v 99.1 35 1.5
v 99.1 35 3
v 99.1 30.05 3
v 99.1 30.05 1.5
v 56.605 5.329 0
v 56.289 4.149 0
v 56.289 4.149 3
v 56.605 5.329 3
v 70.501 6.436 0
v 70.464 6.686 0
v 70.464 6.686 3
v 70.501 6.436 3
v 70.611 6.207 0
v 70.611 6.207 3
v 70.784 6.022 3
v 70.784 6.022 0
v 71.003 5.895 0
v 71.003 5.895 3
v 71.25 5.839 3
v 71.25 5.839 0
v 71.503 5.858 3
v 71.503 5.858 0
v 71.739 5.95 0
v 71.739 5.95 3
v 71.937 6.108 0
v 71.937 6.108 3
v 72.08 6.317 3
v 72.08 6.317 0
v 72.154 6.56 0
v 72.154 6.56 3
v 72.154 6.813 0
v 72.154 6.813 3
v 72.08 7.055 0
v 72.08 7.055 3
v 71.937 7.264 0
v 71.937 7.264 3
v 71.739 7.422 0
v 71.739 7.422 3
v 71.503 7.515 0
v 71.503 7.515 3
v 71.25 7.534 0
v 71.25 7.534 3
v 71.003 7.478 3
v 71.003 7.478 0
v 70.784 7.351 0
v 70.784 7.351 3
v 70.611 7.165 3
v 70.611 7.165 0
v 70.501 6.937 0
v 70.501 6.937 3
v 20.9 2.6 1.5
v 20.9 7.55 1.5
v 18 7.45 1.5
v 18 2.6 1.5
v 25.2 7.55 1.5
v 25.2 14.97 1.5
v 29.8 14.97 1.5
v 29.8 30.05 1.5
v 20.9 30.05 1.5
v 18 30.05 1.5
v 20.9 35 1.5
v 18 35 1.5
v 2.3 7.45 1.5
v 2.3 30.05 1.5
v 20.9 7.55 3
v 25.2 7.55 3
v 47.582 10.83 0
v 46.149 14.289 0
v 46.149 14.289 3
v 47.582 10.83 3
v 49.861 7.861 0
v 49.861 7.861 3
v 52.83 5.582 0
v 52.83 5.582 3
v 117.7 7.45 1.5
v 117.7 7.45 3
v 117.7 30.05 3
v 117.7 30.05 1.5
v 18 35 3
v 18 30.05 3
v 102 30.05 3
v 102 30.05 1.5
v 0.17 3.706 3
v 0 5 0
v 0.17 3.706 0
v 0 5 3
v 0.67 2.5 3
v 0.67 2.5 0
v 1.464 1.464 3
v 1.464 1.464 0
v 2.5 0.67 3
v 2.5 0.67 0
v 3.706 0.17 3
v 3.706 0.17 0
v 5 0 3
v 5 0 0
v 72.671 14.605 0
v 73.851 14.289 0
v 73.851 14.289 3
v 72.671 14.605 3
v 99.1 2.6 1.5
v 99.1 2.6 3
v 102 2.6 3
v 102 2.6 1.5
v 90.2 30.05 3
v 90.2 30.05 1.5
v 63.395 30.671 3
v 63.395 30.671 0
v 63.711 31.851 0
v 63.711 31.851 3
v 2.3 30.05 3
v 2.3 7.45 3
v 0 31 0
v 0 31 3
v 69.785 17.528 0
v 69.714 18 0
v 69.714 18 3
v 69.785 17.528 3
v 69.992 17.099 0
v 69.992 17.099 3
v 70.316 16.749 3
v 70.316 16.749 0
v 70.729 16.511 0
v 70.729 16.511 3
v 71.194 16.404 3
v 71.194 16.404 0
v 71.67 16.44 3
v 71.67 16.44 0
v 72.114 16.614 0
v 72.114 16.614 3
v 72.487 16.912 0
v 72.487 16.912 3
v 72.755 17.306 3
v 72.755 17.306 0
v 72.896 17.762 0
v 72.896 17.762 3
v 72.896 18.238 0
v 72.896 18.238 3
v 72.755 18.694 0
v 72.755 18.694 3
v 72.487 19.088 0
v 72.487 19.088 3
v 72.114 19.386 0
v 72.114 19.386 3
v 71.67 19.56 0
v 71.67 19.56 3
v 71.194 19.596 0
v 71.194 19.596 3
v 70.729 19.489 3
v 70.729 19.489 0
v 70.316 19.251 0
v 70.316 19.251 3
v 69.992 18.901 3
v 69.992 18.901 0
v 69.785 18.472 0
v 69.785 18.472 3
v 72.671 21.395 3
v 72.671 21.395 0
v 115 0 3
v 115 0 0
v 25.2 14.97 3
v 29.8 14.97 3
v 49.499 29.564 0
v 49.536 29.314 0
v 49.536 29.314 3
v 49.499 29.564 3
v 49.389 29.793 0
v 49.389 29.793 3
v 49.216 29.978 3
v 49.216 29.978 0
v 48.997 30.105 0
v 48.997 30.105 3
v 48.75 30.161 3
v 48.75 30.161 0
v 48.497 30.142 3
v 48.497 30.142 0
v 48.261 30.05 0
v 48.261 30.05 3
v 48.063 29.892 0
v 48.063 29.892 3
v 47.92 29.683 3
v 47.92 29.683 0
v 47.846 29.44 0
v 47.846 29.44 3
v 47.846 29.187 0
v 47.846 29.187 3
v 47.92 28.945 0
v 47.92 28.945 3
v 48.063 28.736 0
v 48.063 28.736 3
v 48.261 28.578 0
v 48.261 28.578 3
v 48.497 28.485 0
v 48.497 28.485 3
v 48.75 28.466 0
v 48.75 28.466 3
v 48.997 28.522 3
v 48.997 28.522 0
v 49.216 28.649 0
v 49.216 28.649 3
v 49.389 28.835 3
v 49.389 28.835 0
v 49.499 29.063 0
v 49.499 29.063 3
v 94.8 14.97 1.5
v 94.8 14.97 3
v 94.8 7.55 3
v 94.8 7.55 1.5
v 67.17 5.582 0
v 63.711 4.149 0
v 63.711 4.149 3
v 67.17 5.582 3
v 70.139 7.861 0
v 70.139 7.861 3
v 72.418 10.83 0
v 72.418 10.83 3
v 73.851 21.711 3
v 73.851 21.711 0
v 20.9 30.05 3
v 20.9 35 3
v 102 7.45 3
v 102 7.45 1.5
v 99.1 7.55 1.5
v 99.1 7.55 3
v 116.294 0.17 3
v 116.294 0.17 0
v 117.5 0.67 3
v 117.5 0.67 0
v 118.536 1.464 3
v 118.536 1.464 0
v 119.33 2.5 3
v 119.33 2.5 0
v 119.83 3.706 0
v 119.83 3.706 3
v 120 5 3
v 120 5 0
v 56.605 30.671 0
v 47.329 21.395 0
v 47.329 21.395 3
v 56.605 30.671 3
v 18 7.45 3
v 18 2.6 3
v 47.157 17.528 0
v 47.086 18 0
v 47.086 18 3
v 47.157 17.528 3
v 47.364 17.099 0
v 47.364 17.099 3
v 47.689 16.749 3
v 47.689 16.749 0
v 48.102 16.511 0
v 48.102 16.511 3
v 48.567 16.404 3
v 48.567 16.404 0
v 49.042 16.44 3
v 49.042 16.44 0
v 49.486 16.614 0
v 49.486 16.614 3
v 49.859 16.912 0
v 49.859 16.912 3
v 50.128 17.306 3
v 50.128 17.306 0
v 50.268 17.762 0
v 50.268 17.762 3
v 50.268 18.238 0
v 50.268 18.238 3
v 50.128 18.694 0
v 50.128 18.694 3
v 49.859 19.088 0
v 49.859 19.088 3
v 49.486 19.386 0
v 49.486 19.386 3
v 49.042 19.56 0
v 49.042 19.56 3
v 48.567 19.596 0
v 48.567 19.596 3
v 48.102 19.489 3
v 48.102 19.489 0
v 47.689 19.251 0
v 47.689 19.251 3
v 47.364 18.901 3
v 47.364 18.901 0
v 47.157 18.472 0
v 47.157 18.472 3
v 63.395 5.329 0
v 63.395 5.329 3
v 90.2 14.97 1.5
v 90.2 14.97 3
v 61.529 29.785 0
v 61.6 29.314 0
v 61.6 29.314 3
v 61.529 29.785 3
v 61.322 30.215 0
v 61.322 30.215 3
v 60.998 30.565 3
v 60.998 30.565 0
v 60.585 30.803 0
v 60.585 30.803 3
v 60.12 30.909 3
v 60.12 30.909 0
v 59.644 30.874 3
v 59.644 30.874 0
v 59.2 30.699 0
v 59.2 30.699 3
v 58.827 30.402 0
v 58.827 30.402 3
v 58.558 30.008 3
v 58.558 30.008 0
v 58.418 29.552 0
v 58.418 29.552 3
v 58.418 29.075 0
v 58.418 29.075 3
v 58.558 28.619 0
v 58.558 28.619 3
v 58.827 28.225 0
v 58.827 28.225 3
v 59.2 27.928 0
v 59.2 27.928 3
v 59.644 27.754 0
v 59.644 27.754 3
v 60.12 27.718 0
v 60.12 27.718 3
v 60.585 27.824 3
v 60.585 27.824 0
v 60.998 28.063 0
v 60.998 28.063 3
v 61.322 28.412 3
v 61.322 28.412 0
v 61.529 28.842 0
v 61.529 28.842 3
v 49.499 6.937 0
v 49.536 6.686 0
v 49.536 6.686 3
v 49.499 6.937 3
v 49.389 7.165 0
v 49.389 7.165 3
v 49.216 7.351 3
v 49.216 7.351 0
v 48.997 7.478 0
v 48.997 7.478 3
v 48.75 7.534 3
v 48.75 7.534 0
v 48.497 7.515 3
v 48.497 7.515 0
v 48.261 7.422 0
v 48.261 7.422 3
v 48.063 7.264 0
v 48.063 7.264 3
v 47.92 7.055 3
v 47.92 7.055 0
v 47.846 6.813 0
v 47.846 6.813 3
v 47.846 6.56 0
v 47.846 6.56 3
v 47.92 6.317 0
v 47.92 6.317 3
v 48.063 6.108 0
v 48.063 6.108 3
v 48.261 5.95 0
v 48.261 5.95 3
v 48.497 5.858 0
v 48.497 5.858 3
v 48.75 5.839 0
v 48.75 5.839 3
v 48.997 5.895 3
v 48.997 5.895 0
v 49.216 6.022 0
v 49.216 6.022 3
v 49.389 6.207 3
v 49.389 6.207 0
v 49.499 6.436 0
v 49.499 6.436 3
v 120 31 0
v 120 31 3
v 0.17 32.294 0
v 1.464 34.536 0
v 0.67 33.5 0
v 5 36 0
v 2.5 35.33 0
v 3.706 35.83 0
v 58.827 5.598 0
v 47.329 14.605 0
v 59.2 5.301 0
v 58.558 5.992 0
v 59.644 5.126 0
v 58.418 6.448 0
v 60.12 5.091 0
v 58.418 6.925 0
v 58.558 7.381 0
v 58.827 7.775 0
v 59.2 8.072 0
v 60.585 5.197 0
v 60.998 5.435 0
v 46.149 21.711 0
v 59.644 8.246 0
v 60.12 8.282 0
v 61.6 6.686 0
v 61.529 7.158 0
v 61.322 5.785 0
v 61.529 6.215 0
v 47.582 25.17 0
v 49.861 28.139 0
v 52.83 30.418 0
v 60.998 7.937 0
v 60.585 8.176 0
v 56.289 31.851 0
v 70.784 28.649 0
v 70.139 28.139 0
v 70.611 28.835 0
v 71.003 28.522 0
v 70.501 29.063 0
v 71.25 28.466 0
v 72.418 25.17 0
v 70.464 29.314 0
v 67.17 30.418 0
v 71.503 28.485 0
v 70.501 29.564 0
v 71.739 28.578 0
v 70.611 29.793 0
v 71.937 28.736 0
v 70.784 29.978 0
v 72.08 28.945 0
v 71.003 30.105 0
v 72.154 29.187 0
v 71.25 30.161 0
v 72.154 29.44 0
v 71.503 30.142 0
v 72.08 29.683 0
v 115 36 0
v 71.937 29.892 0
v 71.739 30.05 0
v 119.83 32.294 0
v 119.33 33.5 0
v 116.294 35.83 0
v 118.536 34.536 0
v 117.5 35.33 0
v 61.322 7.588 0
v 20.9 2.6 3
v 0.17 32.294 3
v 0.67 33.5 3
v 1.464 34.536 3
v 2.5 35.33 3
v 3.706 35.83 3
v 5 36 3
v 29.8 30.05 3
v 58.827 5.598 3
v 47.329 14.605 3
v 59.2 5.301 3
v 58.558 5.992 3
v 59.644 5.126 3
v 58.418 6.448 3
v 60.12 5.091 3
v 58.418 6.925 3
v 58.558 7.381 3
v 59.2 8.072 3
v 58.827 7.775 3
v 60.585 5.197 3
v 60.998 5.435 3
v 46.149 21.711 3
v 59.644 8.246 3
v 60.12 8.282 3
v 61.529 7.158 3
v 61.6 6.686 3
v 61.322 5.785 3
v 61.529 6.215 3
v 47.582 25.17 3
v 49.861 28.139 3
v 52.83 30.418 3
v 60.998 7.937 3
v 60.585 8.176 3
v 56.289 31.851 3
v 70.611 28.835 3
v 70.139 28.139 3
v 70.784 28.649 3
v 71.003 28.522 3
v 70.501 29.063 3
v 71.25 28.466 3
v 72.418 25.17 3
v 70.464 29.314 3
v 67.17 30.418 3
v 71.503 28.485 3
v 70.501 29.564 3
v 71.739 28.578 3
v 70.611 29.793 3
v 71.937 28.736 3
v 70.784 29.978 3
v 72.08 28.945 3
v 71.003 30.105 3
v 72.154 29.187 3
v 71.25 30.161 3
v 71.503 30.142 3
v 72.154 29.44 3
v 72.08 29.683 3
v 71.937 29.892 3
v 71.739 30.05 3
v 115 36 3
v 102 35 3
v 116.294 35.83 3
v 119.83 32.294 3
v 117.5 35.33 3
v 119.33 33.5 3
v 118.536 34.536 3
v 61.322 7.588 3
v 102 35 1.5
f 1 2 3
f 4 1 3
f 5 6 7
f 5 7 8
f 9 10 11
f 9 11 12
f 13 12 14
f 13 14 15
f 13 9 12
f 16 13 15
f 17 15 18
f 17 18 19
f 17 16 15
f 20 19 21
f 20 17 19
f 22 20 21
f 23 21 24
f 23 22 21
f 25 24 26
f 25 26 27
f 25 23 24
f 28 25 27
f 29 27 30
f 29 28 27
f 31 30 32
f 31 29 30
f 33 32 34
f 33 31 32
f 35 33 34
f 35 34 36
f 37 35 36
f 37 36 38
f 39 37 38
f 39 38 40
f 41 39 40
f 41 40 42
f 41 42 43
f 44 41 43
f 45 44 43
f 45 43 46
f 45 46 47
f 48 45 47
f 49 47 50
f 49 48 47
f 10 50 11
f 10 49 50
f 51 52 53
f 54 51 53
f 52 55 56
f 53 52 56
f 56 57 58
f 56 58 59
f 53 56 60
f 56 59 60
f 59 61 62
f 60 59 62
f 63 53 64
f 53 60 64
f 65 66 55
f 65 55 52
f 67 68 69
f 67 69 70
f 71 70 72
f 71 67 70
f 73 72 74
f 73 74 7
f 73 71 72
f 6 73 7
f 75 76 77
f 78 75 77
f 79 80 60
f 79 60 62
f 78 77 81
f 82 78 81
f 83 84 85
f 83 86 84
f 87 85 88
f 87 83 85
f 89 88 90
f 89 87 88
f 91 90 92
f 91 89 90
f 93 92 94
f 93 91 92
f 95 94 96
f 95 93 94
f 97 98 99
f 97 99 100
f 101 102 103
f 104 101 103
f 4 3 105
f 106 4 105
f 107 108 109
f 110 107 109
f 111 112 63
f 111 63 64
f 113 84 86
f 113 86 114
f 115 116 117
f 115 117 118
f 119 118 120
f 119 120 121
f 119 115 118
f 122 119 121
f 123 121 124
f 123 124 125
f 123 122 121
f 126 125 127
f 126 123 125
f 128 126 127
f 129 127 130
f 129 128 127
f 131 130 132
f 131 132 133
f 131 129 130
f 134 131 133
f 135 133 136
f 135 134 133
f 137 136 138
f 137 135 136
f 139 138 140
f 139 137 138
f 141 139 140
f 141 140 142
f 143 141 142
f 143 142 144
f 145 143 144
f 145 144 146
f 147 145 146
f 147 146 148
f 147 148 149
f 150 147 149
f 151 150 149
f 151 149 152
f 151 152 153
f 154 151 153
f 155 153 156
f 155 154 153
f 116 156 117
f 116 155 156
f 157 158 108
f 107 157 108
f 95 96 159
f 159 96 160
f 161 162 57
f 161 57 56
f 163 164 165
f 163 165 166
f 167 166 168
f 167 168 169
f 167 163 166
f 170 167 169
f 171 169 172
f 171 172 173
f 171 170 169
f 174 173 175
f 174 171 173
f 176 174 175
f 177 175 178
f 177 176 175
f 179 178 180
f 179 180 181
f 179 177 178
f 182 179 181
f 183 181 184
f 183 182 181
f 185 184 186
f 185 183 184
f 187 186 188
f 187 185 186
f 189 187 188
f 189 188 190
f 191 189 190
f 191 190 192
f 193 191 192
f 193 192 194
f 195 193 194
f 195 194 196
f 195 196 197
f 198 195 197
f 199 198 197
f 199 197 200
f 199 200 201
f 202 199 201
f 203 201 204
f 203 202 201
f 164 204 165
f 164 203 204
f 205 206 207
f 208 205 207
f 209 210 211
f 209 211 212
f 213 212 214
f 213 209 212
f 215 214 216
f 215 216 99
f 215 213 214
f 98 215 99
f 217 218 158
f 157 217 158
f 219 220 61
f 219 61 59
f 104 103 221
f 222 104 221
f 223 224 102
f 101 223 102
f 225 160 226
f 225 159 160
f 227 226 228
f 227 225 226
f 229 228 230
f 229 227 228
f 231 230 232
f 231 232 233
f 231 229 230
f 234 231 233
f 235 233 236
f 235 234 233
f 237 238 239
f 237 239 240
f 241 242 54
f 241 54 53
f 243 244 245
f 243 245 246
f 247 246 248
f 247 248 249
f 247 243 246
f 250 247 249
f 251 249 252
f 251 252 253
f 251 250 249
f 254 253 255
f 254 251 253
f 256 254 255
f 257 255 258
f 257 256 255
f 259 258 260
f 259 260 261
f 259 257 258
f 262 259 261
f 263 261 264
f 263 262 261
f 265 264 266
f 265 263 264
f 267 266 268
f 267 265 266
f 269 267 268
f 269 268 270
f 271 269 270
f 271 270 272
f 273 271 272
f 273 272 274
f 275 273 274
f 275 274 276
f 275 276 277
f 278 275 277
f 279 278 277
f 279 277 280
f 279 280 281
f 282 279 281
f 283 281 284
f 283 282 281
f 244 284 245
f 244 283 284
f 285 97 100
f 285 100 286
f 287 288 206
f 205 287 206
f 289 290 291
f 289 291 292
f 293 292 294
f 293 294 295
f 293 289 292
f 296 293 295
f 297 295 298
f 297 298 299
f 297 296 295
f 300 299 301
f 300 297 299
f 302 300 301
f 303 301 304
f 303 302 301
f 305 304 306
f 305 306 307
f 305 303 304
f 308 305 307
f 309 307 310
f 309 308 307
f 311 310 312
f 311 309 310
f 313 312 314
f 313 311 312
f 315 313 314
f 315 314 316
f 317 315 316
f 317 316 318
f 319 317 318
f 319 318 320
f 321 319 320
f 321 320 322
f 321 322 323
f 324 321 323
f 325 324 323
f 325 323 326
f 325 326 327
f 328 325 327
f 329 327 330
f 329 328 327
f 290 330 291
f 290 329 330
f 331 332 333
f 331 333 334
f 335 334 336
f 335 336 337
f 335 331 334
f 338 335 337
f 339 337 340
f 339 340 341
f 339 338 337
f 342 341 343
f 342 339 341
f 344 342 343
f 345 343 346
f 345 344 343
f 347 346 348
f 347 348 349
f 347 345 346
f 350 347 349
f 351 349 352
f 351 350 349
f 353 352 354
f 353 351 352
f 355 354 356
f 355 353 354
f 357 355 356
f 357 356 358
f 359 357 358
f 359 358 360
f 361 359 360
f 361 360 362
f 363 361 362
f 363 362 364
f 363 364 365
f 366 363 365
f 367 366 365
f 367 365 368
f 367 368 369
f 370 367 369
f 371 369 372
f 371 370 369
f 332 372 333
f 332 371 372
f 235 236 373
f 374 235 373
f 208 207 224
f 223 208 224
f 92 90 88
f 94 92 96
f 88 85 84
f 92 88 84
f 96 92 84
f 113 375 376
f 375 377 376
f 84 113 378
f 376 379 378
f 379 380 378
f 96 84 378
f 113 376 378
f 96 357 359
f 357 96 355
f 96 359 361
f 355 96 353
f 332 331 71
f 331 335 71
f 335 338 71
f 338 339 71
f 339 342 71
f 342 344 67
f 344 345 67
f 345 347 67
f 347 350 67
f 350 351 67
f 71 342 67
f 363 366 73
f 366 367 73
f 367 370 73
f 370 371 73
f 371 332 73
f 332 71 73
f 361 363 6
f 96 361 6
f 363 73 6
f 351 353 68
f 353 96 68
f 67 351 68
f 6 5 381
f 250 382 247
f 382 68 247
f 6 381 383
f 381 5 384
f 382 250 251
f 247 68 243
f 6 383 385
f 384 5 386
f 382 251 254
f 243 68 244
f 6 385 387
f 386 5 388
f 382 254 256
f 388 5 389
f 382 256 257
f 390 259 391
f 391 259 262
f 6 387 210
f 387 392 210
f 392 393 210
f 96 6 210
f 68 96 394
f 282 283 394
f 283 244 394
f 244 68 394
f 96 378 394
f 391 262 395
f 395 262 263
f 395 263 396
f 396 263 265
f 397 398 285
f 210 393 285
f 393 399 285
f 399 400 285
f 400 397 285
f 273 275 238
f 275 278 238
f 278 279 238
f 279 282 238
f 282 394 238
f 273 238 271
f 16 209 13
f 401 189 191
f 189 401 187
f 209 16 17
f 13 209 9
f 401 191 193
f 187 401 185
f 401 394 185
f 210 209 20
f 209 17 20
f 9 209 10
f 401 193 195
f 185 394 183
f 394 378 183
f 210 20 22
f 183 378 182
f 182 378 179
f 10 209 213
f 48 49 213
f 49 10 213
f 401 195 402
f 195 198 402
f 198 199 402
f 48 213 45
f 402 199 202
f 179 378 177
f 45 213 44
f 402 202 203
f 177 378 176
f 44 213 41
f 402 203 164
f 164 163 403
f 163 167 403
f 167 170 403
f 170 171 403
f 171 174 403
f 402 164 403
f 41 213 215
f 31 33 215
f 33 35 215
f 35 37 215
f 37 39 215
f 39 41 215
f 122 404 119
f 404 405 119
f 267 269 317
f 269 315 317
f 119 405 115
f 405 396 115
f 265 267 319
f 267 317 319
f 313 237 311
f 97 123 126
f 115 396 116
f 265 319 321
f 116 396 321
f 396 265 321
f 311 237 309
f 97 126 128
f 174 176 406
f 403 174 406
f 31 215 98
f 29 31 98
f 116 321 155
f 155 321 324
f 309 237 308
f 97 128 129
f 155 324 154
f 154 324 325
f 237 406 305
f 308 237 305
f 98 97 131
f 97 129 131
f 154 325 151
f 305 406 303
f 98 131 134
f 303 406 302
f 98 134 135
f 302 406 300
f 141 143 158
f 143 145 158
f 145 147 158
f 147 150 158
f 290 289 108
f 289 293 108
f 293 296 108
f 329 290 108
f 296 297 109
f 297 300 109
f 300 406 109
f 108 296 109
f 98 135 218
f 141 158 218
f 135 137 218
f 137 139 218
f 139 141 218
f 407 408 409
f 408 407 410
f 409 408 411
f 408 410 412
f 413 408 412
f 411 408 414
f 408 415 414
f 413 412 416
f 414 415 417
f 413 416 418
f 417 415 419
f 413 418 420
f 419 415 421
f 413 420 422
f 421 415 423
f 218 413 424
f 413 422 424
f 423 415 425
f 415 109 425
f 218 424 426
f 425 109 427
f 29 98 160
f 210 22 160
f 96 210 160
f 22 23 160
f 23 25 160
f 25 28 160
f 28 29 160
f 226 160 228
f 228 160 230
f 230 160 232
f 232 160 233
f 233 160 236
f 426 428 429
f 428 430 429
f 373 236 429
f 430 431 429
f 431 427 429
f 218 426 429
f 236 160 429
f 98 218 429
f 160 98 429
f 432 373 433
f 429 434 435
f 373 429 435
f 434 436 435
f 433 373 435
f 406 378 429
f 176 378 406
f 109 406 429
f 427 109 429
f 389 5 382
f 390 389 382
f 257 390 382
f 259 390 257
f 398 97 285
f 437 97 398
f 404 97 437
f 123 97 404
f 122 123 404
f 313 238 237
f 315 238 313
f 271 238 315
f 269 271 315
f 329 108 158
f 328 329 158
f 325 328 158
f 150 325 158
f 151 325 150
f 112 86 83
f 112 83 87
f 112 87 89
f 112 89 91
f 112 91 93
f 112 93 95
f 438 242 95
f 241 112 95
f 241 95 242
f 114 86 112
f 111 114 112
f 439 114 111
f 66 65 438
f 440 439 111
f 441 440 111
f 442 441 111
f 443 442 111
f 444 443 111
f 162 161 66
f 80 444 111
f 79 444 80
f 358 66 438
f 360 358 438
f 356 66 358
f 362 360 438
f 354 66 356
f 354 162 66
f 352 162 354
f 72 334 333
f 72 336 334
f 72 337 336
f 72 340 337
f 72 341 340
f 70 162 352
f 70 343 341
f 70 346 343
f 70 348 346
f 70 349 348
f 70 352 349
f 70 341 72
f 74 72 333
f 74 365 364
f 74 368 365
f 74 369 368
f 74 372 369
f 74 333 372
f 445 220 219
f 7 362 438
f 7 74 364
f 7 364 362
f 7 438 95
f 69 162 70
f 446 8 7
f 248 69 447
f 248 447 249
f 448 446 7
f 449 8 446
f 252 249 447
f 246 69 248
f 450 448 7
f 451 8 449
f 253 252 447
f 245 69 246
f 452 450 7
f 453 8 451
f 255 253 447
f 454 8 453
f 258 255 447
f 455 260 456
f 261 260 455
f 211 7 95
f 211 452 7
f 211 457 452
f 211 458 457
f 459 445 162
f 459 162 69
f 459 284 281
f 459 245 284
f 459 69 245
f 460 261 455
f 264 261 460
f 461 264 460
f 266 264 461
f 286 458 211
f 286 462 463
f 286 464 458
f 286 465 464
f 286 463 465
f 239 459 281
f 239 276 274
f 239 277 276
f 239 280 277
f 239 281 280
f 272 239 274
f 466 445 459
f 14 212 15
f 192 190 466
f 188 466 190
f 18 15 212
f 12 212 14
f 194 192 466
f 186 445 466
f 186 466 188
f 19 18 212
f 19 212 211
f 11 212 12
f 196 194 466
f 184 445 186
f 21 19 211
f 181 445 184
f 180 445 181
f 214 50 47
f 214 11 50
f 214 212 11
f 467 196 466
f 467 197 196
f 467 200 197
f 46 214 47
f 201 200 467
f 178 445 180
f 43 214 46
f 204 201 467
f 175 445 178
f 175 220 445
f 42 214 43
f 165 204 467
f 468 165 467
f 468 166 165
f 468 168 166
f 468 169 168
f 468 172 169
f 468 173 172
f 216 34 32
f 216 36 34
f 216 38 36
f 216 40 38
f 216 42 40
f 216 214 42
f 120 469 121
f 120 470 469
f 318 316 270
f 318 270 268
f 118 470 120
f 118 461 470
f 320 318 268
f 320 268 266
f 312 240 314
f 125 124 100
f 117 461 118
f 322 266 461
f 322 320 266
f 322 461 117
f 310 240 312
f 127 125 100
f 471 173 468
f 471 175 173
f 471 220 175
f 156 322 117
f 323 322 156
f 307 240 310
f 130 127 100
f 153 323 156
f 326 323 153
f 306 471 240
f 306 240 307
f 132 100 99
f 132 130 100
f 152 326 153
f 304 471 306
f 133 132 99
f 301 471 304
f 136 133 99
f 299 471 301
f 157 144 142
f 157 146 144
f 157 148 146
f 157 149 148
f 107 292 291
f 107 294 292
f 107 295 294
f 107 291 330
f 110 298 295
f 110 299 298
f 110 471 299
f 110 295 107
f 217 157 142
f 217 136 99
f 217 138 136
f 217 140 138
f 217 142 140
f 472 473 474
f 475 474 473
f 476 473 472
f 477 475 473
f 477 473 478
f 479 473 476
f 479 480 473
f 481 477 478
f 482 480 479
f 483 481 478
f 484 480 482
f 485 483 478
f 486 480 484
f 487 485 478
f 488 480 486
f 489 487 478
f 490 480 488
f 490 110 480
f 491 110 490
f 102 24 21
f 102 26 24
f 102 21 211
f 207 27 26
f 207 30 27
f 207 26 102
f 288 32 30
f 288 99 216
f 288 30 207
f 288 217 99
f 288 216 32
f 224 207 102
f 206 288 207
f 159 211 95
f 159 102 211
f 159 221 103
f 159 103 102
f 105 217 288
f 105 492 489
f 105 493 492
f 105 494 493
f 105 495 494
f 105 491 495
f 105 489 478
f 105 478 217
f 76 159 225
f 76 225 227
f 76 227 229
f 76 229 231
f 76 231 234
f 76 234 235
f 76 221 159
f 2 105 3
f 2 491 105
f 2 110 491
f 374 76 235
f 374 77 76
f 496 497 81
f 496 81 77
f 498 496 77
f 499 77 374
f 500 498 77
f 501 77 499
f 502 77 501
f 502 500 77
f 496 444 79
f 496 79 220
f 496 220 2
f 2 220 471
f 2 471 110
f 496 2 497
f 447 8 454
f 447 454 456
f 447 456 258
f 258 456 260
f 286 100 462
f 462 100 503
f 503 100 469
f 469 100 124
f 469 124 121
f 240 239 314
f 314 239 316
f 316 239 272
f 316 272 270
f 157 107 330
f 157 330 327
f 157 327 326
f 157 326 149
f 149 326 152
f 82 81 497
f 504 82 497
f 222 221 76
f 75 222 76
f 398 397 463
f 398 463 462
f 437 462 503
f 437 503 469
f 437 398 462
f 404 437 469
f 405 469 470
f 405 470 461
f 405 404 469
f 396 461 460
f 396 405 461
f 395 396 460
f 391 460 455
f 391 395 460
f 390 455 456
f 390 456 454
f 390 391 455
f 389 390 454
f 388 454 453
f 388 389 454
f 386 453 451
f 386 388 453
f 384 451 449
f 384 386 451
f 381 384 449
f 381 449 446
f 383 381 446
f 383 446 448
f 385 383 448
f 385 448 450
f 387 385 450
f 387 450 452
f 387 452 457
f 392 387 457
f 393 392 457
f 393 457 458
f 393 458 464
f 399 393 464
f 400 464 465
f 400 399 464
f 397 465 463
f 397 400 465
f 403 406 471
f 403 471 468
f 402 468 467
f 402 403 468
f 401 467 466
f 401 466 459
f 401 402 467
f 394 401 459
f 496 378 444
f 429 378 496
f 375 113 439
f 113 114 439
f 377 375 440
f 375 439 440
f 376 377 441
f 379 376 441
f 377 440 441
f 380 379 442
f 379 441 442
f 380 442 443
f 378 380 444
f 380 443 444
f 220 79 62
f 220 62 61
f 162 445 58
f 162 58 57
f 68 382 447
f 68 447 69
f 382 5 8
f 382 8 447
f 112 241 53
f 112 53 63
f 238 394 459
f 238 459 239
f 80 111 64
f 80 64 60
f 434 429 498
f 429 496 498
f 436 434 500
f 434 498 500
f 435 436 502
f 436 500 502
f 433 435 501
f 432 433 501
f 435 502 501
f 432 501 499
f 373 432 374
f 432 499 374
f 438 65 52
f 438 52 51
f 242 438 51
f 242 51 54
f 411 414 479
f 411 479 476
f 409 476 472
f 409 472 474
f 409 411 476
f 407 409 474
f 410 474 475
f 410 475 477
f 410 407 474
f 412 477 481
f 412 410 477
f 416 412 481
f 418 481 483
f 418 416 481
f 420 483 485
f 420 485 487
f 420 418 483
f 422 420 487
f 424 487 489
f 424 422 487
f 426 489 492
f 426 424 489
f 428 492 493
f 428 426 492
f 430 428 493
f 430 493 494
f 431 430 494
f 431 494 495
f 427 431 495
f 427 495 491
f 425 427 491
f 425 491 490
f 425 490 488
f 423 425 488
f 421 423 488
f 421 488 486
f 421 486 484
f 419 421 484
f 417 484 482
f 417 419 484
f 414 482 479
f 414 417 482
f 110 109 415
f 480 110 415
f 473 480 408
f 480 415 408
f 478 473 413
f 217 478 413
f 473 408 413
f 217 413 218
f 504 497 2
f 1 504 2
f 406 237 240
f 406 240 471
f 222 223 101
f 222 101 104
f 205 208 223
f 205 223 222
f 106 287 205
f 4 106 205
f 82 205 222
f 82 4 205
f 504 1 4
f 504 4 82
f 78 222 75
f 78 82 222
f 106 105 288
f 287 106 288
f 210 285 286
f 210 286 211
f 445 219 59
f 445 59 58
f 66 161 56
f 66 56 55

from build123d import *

# Parameters (mm, degrees)
SKETCH_1_W          = 120
SKETCH_1_H          = 36
SKETCH_1_R          = 0.85
SKETCH_1_R_2        = 1.6
EXTRUDE_1_DEPTH     = 3
CUT_EXTRUDE_1_DEPTH = 1.5
FILLET_1_R          = 5


with BuildPart() as part:
    # 草图1 → 凸台-拉伸1 (new body)
    with BuildSketch(Plane.XY):
        with Locations((60, 18)):
            Rectangle(SKETCH_1_W, SKETCH_1_H)
        with Locations((48.686291501, 29.313708499)):
            Circle(SKETCH_1_R, mode=Mode.SUBTRACT)
        with Locations((48.686291501, 6.686291501)):
            Circle(SKETCH_1_R, mode=Mode.SUBTRACT)
        with Locations(Location((71.313708499, 6.686291501, 0), (0, 0, 180))):
            Circle(SKETCH_1_R, mode=Mode.SUBTRACT)
        with Locations(Location((71.313708499, 29.313708499, 0), (0, 0, 180))):
            Circle(SKETCH_1_R, mode=Mode.SUBTRACT)
        with Locations((60, 29.313708499)):
            Circle(SKETCH_1_R_2, mode=Mode.SUBTRACT)
        with Locations(Location((48.686291501, 18, 0), (0, 0, 180))):
            Circle(SKETCH_1_R_2, mode=Mode.SUBTRACT)
        with Locations((60, 6.686291501)):
            Circle(SKETCH_1_R_2, mode=Mode.SUBTRACT)
        with Locations(Location((71.313708499, 18, 0), (0, 0, 180))):
            Circle(SKETCH_1_R_2, mode=Mode.SUBTRACT)
        with BuildLine():
            Line((56.604710662, 30.671392317), (56.28868628, 31.850811367))
            ThreePointArc((56.28868628, 31.850811367), (49.860502354, 28.139497646), (46.149188633, 21.71131372))
            Line((46.149188633, 21.71131372), (47.328607683, 21.395289338))
            Line((47.328607683, 21.395289338), (56.604710662, 30.671392317))
        make_face(mode=Mode.SUBTRACT)
        with BuildLine():
            Line((63.395289338, 30.671392317), (63.71131372, 31.850811367))
            ThreePointArc((63.71131372, 31.850811367), (70.139497646, 28.139497646), (73.850811367, 21.71131372))
            Line((73.850811367, 21.71131372), (72.671392317, 21.395289338))
            Line((72.671392317, 21.395289338), (63.395289338, 30.671392317))
        make_face(mode=Mode.SUBTRACT)
        with BuildLine():
            Line((63.395289338, 5.328607683), (63.71131372, 4.149188633))
            ThreePointArc((63.71131372, 4.149188633), (70.139497646, 7.860502354), (73.850811367, 14.28868628))
            Line((73.850811367, 14.28868628), (72.671392317, 14.604710662))
            Line((72.671392317, 14.604710662), (63.395289338, 5.328607683))
        make_face(mode=Mode.SUBTRACT)
        with BuildLine():
            Line((47.328607683, 14.604710662), (46.149188633, 14.28868628))
            ThreePointArc((46.149188633, 14.28868628), (49.860502354, 7.860502354), (56.28868628, 4.149188633))
            Line((56.28868628, 4.149188633), (56.604710662, 5.328607683))
            Line((56.604710662, 5.328607683), (47.328607683, 14.604710662))
        make_face(mode=Mode.SUBTRACT)
    extrude(amount=EXTRUDE_1_DEPTH)

    # 草图2 → 切除-拉伸1 (cut)
    with BuildSketch(Plane.XY.offset(3)):
        Polygon((2.3, 30.05), (18, 30.05), (18, 35), (20.9, 35), (20.9, 30.05), (29.8, 30.05), (29.8, 14.97), (25.2, 14.97), (25.2, 7.55), (20.9, 7.55), (20.9, 2.6), (18, 2.6), (18, 7.45), (2.3, 7.45), align=None)
        Polygon((117.7, 30.05), (102, 30.05), (102, 35), (99.1, 35), (99.1, 30.05), (90.2, 30.05), (90.2, 14.97), (94.8, 14.97), (94.8, 7.55), (99.1, 7.55), (99.1, 2.6), (102, 2.6), (102, 7.45), (117.7, 7.45), align=None)
    extrude(amount=-CUT_EXTRUDE_1_DEPTH, mode=Mode.SUBTRACT)

    # 圆角1
    fillet_1_edges = [part.edges().sort_by_distance(p)[0] for p in [
        (0, 36, 1.5),
        (120, 36, 1.5),
        (120, 0, 1.5),
        (0, 0, 1.5),
    ]]
    fillet(fillet_1_edges, radius=FILLET_1_R)


solid = part.part
